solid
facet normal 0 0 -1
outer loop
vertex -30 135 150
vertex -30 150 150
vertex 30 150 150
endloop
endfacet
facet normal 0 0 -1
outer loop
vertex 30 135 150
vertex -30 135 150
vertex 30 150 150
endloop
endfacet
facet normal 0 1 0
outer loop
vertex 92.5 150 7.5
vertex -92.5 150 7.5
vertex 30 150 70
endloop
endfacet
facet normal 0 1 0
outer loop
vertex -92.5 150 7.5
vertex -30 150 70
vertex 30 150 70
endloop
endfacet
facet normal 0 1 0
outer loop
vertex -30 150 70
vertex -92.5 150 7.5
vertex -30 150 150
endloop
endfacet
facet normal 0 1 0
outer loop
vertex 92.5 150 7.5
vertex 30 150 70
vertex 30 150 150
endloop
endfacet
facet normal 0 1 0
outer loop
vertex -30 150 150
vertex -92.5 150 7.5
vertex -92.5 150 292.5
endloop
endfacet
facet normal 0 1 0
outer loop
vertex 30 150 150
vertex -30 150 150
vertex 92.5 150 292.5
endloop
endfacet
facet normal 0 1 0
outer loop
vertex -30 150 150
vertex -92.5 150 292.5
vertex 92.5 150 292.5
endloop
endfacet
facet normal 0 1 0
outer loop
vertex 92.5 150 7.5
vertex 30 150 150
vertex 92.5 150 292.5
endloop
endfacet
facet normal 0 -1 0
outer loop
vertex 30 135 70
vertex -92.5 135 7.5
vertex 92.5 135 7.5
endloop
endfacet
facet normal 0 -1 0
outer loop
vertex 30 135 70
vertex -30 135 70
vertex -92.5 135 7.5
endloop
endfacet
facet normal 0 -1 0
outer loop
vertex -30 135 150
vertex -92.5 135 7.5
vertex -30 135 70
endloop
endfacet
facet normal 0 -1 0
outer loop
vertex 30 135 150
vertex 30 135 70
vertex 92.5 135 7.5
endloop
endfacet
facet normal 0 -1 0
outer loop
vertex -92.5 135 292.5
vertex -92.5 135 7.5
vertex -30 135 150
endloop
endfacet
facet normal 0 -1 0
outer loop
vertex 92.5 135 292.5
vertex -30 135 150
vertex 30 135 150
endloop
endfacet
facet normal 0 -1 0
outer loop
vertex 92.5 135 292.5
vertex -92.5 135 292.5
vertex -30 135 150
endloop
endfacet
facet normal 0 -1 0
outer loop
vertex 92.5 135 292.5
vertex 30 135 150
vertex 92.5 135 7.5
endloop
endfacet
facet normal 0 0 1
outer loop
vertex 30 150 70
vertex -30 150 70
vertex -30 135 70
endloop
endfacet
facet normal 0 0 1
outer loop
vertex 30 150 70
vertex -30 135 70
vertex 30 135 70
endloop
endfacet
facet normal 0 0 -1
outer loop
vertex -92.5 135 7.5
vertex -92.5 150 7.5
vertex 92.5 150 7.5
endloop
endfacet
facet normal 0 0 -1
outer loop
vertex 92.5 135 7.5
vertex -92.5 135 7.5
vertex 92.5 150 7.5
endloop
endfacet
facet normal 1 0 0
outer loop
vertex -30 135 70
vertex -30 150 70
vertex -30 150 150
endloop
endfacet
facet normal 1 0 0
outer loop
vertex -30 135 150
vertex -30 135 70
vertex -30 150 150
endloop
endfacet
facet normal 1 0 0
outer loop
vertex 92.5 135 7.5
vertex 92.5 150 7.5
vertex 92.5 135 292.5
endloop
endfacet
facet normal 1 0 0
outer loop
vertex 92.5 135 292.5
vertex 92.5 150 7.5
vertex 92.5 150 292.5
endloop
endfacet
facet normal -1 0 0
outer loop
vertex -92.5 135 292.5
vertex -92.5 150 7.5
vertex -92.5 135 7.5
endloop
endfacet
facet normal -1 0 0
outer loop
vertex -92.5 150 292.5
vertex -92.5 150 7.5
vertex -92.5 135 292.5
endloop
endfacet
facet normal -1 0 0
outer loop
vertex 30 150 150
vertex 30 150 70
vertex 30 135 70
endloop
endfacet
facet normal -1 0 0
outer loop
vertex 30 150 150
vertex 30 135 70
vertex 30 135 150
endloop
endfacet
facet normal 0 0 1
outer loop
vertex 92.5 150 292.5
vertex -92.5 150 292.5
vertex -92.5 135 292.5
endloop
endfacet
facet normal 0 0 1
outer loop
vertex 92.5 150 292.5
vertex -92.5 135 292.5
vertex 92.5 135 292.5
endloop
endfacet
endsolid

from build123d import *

# Parameters (mm, degrees)
F6_W     = 185
F6_H     = 285
F7_DEPTH = 15
F8_W     = 60
F8_H     = 80
F9_DEPTH = 15


with BuildPart() as f7:
    # F6 (on offset) → F7 (new body, through all)
    with BuildSketch(Plane.XZ.offset(-150)):
        with Locations((0, 150)):
            Rectangle(F6_W, F6_H)
    extrude(amount=F7_DEPTH)

    # F8 (on offset) → F9 (cut, through all)
    with BuildSketch(Plane.XZ.offset(-150)):
        with Locations((0, 110)):
            Rectangle(F8_W, F8_H)
    extrude(amount=F9_DEPTH, mode=Mode.SUBTRACT)


solid = f7.part
